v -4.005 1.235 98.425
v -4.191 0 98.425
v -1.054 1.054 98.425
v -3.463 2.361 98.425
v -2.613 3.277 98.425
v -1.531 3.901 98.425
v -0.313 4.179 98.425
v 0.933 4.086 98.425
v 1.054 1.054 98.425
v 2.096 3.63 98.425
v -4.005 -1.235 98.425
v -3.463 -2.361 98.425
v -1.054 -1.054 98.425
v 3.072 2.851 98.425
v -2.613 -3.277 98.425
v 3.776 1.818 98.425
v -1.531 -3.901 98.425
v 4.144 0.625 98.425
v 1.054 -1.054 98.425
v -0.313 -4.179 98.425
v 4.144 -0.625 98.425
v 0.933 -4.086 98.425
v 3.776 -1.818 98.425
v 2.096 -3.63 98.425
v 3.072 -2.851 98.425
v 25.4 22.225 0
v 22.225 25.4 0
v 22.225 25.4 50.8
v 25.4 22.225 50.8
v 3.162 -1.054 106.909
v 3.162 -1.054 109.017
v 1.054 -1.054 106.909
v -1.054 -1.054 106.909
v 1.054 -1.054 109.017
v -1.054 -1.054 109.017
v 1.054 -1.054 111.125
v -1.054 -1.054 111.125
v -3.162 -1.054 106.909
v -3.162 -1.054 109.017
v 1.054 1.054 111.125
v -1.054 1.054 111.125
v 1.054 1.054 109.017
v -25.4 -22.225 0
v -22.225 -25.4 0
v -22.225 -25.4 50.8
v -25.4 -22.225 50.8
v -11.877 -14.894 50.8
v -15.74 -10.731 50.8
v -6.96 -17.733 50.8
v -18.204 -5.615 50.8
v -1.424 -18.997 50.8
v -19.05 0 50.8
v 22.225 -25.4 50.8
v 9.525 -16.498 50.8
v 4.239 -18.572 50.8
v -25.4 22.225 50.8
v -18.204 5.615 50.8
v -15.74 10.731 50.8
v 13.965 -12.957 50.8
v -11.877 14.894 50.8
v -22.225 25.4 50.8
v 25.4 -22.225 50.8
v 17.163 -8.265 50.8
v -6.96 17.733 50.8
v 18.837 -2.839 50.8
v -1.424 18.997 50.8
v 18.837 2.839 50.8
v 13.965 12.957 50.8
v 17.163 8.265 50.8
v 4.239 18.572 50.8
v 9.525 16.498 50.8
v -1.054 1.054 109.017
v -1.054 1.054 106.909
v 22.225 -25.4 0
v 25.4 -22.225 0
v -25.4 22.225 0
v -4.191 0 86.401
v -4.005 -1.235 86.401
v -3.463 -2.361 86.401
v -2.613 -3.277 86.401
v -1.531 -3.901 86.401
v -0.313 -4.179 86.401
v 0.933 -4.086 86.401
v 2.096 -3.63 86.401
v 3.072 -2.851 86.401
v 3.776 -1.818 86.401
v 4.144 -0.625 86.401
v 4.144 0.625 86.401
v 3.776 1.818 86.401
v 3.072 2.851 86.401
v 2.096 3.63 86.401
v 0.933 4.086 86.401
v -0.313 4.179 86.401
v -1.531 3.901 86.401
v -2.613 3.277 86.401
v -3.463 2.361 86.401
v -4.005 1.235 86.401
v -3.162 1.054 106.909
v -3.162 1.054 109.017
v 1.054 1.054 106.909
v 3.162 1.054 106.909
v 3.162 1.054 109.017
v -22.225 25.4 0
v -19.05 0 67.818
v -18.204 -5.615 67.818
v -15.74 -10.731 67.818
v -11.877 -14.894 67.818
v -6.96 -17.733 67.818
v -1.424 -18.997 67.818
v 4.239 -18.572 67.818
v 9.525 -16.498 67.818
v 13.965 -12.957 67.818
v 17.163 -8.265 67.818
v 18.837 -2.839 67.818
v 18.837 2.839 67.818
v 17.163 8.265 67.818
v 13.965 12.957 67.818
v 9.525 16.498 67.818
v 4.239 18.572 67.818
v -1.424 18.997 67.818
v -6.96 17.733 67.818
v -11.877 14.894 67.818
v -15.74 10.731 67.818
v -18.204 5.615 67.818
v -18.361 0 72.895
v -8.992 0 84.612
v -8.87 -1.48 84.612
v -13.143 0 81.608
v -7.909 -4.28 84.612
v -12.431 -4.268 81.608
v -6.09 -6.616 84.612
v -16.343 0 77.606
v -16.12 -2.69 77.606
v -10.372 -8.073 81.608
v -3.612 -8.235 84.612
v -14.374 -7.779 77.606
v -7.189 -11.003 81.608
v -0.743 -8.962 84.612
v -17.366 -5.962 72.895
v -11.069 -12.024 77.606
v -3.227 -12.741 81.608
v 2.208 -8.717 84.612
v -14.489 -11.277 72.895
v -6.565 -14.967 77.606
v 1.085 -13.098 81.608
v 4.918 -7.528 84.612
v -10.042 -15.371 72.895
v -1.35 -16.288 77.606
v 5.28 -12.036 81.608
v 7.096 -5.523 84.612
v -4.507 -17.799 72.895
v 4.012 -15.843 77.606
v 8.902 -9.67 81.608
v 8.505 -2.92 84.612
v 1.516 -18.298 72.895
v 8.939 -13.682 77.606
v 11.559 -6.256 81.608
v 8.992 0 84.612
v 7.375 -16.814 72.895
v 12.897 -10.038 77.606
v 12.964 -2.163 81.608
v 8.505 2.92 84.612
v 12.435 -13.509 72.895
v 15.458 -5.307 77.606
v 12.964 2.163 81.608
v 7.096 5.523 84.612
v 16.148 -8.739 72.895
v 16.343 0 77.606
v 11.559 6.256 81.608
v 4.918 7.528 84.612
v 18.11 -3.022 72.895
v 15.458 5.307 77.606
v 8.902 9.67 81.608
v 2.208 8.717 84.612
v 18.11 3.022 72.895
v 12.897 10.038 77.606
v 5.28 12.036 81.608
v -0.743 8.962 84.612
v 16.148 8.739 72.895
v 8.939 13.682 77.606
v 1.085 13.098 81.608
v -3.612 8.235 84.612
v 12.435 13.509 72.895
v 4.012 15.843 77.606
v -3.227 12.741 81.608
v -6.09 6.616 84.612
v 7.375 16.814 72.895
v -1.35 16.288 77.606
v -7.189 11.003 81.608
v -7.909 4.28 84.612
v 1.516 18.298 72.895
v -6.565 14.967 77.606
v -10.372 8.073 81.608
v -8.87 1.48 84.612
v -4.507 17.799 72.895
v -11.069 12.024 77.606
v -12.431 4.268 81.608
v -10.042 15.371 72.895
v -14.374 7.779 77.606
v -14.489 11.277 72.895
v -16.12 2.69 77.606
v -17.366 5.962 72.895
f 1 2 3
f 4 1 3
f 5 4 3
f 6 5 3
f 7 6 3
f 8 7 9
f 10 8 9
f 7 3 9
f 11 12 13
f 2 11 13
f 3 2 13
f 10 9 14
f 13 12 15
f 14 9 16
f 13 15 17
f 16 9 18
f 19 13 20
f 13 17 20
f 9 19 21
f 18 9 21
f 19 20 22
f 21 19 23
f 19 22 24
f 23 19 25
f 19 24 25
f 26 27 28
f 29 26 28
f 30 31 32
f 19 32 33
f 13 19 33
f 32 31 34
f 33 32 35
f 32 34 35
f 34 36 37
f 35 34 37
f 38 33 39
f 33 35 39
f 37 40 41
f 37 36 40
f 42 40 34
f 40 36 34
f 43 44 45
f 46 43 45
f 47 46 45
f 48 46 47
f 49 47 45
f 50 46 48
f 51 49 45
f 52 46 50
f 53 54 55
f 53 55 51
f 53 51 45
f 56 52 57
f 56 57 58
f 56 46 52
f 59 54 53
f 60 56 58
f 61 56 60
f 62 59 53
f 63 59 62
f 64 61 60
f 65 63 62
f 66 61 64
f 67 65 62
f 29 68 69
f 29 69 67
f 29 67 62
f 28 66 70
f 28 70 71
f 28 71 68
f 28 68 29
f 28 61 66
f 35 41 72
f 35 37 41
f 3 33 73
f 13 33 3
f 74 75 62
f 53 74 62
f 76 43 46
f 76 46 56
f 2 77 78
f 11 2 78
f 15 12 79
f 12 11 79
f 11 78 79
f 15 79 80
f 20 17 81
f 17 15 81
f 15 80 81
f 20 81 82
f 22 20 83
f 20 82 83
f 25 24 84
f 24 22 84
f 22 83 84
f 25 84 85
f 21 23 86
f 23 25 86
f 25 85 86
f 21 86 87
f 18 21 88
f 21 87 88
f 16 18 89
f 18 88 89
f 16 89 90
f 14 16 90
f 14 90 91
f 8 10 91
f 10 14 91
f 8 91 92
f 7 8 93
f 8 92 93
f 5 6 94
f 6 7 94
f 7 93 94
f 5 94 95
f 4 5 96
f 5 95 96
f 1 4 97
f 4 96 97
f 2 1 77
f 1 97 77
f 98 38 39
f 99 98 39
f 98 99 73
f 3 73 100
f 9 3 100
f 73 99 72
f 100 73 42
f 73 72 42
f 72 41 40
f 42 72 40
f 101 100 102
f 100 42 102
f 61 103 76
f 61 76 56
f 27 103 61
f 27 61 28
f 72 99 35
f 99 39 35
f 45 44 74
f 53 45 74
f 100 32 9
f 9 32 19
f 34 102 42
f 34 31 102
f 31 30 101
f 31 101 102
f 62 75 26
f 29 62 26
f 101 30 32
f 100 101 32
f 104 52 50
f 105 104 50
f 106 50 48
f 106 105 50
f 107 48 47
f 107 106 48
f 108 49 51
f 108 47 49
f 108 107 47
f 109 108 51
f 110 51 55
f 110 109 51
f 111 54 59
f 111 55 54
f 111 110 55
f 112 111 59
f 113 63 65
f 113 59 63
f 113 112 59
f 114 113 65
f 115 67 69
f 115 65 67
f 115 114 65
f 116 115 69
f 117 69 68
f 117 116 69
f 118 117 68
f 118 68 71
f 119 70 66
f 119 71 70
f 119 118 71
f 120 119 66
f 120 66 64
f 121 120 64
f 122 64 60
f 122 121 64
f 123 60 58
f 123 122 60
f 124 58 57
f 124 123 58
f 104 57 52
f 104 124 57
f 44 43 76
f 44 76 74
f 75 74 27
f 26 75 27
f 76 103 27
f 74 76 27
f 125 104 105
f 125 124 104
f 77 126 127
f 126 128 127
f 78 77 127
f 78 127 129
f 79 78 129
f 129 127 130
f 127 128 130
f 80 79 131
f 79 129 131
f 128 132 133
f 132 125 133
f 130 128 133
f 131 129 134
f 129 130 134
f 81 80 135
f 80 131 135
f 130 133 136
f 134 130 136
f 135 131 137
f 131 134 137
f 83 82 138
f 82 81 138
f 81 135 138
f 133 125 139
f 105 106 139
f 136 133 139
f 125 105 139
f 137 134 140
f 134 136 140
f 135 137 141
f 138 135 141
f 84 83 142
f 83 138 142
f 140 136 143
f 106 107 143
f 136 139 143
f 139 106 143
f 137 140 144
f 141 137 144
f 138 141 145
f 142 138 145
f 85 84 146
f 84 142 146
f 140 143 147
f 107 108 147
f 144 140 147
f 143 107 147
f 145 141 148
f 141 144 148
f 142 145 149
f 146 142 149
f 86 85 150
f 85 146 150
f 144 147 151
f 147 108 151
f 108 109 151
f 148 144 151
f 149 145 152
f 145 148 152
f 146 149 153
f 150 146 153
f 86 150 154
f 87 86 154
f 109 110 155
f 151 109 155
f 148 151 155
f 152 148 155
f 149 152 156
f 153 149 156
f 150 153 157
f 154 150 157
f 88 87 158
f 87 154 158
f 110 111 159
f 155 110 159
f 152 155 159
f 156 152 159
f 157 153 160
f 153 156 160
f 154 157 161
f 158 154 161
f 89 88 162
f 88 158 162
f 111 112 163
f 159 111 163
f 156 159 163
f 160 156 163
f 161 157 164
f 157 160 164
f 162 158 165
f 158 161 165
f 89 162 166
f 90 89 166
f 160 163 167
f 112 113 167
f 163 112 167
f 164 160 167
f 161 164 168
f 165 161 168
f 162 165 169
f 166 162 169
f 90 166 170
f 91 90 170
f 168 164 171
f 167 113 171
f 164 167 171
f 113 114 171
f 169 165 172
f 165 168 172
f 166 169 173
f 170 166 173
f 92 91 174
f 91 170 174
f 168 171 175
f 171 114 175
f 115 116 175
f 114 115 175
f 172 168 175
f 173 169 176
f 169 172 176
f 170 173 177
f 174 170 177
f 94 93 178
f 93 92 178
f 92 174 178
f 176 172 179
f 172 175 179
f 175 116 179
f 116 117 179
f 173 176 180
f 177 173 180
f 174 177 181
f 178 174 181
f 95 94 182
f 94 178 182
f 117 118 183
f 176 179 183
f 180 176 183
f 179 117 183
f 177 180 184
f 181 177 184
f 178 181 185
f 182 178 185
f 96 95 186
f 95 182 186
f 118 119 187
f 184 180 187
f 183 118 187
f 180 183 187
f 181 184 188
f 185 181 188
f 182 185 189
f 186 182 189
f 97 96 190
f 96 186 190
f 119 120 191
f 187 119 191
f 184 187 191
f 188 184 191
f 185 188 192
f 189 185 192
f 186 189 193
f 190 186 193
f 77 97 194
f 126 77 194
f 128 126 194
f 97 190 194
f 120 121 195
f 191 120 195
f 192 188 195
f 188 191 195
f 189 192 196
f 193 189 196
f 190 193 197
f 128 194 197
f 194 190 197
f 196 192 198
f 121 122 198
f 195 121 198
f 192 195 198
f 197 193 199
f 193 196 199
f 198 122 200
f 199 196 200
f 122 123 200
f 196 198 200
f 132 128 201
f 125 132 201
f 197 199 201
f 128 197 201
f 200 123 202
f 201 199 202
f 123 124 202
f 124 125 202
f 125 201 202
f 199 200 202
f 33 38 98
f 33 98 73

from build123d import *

# Parameters (mm, degrees)
F0_W     = 50.8
F0_H     = 50.8
F1_DEPTH = 50.8
F2_SIZE  = 3.175
F3_W     = 19.05
F3_H     = 17.018
F5_W     = 2.1082
F5_H     = 2.1082
F6_DEPTH = 1.0541


with BuildPart() as f1:
    # F0 (on Top) → F1 (new body)
    with BuildSketch(Plane.XY):
        Rectangle(F0_W, F0_H)
    extrude(amount=F1_DEPTH)

    # F2
    f2_edges = [f1.edges().sort_by_distance(p)[0] for p in [
        (25.4, -25.4, 25.4),
        (25.4, 25.4, 25.4),
        (-25.4, 25.4, 25.4),
        (-25.4, -25.4, 25.4),
    ]]
    chamfer(f2_edges, length=F2_SIZE)

    # F3 (on Front) → F4 (revolve)
    with BuildSketch(Plane.XZ):
        with Locations((-9.525, 59.309)):
            Rectangle(F3_W, F3_H)
        with BuildLine():
            Line((-19.05, 67.818), (0, 67.818))
            Line((0, 67.818), (0, 86.4012725589))
            Line((0, 86.4012725589), (-4.191, 86.4012725589))
            ThreePointArc((-4.191, 86.4012725589), (-14.8785256326, 79.7147211869), (-19.05, 67.818))
        make_face()
        Polygon((-4.191, 86.4012725589), (0, 86.4012725589), (0, 86.868), (0, 98.425), (-4.191, 98.425), align=None)
    revolve(axis=Axis((0, 0, 59.309), (0, 0, 1)))

    # F5 (on Front) → F6 (join, symmetric)
    with BuildSketch(Plane.XZ):
        with Locations((-2.1082, 107.9627)):
            Rectangle(F5_W, F5_H)
        Polygon((-1.0541, 98.425), (0, 98.425), (0, 111.125), (-1.0541, 111.125), (-1.0541, 109.0168), (-1.0541, 106.9086), align=None)
    extrude(amount=F6_DEPTH, both=True)

    # F7: F1 across face


with BuildPart() as f1_1:
    add(f1.part)
    add(f1.part.mirror(Plane(origin=(0, 0, 104.775), x_dir=(0, 1, 0), z_dir=(1, 0, 0))))


solid = f1_1.part
